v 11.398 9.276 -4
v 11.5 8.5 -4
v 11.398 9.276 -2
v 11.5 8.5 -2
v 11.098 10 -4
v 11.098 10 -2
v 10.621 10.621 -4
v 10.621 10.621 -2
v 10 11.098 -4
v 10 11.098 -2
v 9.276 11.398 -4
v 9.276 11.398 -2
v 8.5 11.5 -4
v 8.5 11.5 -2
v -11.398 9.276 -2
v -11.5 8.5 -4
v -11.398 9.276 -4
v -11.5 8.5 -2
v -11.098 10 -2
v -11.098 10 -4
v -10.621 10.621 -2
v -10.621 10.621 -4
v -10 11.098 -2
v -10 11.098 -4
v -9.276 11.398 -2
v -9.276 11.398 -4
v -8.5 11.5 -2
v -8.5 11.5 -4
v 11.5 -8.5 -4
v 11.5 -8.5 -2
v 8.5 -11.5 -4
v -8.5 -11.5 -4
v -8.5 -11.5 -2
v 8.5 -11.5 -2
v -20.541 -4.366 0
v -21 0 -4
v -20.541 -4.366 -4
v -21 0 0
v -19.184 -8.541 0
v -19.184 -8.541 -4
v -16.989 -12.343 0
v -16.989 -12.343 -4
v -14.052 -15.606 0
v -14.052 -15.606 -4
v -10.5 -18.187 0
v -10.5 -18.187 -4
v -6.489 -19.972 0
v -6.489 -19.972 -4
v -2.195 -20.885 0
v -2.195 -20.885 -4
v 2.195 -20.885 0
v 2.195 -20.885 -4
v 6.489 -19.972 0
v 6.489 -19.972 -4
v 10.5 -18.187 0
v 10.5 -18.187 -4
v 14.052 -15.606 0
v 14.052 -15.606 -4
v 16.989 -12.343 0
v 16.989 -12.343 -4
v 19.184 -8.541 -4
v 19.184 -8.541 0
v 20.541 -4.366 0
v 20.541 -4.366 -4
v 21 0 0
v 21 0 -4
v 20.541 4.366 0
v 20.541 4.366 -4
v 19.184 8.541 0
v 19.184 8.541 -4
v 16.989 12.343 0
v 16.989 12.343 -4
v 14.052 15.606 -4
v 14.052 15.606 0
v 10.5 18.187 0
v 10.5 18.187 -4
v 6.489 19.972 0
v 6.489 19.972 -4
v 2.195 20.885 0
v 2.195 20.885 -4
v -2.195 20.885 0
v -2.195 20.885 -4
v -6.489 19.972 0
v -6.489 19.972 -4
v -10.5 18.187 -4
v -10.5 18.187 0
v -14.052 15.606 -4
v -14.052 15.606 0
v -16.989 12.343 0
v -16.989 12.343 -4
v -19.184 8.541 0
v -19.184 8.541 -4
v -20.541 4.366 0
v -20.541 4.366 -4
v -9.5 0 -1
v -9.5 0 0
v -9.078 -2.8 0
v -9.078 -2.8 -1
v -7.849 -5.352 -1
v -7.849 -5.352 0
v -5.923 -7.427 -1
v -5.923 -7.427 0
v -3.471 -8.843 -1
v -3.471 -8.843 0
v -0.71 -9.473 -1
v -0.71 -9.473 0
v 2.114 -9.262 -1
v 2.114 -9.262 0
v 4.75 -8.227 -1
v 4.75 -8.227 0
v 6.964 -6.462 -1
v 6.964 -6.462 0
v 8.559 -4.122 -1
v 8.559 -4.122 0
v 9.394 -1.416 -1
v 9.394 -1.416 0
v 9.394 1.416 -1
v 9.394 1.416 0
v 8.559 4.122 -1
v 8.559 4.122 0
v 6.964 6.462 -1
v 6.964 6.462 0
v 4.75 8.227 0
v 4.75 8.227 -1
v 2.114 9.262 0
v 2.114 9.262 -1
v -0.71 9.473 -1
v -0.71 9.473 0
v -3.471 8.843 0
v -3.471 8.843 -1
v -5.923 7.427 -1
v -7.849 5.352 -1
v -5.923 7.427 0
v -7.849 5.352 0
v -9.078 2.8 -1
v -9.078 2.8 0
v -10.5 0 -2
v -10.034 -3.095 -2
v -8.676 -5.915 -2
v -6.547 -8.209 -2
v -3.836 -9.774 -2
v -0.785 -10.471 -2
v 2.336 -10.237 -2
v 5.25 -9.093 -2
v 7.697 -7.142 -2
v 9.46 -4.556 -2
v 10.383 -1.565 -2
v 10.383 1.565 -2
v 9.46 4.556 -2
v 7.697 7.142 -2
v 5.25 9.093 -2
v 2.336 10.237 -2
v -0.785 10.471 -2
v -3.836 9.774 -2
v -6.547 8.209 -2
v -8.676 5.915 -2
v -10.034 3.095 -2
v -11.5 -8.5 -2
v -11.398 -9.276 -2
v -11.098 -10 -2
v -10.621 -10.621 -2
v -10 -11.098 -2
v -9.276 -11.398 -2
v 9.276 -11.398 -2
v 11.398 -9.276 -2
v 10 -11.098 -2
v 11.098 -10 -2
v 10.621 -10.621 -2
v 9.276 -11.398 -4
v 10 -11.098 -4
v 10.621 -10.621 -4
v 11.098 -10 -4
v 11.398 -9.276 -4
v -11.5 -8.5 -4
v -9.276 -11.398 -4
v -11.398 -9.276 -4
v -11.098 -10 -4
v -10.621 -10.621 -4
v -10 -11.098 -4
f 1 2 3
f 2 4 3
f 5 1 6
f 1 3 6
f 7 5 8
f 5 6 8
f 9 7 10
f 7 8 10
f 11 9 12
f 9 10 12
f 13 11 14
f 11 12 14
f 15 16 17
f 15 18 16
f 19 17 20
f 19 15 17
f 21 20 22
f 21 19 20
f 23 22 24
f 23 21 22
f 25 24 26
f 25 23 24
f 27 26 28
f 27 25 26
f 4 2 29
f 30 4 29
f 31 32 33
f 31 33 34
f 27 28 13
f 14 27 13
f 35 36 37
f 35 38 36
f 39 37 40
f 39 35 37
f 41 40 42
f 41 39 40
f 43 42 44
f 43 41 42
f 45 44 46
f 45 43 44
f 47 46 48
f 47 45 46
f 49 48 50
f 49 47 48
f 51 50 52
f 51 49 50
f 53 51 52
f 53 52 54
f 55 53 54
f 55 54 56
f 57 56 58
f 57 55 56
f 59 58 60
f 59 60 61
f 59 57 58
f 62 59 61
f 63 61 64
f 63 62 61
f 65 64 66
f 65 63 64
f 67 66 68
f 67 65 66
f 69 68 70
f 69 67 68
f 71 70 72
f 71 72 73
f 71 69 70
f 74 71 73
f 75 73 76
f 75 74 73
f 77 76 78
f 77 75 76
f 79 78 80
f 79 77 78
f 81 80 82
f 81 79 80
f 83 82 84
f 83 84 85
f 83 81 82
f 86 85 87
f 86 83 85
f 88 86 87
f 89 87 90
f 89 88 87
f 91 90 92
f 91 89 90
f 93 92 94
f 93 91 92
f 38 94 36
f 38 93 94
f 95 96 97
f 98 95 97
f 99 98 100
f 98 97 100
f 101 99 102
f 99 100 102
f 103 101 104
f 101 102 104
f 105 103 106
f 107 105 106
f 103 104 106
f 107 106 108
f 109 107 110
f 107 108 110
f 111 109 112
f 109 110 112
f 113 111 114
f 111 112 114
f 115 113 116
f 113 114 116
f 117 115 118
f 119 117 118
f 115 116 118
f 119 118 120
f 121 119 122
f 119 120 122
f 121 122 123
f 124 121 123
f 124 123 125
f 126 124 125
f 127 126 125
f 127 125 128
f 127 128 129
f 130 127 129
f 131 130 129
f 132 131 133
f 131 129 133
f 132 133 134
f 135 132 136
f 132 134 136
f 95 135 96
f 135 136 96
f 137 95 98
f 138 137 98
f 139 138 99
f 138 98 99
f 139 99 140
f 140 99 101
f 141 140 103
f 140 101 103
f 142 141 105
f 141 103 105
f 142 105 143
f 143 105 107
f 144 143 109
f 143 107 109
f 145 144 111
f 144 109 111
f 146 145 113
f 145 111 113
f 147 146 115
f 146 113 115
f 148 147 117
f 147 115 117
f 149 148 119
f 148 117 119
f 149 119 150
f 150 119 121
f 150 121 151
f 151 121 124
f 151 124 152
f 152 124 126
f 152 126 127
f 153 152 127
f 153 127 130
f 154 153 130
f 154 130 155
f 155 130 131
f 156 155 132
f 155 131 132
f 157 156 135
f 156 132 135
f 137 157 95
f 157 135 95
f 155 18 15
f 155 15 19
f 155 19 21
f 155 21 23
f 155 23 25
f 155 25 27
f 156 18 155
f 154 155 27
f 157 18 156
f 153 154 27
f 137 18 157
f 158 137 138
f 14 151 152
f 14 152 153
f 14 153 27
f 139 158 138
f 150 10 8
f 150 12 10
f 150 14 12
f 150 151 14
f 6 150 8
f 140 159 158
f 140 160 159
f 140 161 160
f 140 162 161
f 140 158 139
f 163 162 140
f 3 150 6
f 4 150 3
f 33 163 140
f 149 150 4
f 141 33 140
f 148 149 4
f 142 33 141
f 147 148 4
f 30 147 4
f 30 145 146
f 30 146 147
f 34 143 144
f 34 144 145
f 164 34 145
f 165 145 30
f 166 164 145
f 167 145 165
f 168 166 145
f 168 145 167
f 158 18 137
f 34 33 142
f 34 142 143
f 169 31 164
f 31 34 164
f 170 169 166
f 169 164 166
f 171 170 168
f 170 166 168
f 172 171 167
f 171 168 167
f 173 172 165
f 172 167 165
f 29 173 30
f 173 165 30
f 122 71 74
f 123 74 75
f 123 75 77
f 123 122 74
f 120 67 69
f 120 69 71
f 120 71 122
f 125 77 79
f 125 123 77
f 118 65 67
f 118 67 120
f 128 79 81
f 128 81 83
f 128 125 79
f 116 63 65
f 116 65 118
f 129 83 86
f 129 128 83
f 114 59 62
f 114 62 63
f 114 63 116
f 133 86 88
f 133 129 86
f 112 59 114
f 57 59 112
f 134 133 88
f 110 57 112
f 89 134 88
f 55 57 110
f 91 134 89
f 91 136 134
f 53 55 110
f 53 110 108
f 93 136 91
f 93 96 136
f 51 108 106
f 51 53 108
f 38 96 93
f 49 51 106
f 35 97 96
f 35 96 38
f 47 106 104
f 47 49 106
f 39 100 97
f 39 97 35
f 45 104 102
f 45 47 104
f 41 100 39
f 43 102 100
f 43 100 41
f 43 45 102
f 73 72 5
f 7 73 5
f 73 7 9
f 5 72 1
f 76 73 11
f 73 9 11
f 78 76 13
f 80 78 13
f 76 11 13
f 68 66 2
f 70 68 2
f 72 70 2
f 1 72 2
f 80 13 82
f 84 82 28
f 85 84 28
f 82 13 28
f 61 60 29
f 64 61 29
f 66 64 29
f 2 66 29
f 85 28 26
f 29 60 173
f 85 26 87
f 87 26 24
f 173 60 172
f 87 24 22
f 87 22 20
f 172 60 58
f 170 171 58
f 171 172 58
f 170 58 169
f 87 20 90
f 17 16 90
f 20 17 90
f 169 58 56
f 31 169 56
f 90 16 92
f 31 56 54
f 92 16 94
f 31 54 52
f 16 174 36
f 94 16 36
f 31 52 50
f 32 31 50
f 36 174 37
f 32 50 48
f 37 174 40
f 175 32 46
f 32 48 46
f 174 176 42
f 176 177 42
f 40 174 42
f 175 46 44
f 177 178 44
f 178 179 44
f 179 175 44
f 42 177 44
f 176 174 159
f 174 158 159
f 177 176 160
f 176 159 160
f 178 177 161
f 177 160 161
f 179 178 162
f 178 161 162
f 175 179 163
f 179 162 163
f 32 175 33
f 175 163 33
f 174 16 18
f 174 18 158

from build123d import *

# Parameters (mm, degrees)
SKETCH001_W  = 11.5
SKETCH001_H  = 4
SKETCH002_W  = 23
SKETCH002_H  = 23
POCKET_DEPTH = 2
FILLET_R     = 3
CHAMFER_SIZE = 1


with BuildPart() as part:
    # Sketch001 → Revolution001 (revolve)
    with BuildSketch(Plane.XZ):
        with Locations((-15.25, -2)):
            Rectangle(SKETCH001_W, SKETCH001_H)
    revolve(axis=Axis((0, 0, 0), (0, 0, 1)))

    # Sketch002 (on Face3 of Revolution001) → Pocket (cut)
    with BuildSketch(Plane(origin=(0, 0, -4), x_dir=(1, 0, 0), z_dir=(0, 0, -1))):
        Rectangle(SKETCH002_W, SKETCH002_H)
    extrude(amount=-POCKET_DEPTH, mode=Mode.SUBTRACT)

    # Fillet
    fillet_edges = [part.edges().sort_by_distance(p)[0] for p in [
        (-11.5, 11.5, -3),
        (11.5, 11.5, -3),
        (11.5, -11.5, -3),
        (-11.5, -11.5, -3),
    ]]
    fillet(fillet_edges, radius=FILLET_R)

    # Chamfer
    chamfer_edges = [part.edges().sort_by_distance(p)[0] for p in [
        (9.5, 0, -2),
    ]]
    chamfer(chamfer_edges, length=CHAMFER_SIZE)


solid = part.part
